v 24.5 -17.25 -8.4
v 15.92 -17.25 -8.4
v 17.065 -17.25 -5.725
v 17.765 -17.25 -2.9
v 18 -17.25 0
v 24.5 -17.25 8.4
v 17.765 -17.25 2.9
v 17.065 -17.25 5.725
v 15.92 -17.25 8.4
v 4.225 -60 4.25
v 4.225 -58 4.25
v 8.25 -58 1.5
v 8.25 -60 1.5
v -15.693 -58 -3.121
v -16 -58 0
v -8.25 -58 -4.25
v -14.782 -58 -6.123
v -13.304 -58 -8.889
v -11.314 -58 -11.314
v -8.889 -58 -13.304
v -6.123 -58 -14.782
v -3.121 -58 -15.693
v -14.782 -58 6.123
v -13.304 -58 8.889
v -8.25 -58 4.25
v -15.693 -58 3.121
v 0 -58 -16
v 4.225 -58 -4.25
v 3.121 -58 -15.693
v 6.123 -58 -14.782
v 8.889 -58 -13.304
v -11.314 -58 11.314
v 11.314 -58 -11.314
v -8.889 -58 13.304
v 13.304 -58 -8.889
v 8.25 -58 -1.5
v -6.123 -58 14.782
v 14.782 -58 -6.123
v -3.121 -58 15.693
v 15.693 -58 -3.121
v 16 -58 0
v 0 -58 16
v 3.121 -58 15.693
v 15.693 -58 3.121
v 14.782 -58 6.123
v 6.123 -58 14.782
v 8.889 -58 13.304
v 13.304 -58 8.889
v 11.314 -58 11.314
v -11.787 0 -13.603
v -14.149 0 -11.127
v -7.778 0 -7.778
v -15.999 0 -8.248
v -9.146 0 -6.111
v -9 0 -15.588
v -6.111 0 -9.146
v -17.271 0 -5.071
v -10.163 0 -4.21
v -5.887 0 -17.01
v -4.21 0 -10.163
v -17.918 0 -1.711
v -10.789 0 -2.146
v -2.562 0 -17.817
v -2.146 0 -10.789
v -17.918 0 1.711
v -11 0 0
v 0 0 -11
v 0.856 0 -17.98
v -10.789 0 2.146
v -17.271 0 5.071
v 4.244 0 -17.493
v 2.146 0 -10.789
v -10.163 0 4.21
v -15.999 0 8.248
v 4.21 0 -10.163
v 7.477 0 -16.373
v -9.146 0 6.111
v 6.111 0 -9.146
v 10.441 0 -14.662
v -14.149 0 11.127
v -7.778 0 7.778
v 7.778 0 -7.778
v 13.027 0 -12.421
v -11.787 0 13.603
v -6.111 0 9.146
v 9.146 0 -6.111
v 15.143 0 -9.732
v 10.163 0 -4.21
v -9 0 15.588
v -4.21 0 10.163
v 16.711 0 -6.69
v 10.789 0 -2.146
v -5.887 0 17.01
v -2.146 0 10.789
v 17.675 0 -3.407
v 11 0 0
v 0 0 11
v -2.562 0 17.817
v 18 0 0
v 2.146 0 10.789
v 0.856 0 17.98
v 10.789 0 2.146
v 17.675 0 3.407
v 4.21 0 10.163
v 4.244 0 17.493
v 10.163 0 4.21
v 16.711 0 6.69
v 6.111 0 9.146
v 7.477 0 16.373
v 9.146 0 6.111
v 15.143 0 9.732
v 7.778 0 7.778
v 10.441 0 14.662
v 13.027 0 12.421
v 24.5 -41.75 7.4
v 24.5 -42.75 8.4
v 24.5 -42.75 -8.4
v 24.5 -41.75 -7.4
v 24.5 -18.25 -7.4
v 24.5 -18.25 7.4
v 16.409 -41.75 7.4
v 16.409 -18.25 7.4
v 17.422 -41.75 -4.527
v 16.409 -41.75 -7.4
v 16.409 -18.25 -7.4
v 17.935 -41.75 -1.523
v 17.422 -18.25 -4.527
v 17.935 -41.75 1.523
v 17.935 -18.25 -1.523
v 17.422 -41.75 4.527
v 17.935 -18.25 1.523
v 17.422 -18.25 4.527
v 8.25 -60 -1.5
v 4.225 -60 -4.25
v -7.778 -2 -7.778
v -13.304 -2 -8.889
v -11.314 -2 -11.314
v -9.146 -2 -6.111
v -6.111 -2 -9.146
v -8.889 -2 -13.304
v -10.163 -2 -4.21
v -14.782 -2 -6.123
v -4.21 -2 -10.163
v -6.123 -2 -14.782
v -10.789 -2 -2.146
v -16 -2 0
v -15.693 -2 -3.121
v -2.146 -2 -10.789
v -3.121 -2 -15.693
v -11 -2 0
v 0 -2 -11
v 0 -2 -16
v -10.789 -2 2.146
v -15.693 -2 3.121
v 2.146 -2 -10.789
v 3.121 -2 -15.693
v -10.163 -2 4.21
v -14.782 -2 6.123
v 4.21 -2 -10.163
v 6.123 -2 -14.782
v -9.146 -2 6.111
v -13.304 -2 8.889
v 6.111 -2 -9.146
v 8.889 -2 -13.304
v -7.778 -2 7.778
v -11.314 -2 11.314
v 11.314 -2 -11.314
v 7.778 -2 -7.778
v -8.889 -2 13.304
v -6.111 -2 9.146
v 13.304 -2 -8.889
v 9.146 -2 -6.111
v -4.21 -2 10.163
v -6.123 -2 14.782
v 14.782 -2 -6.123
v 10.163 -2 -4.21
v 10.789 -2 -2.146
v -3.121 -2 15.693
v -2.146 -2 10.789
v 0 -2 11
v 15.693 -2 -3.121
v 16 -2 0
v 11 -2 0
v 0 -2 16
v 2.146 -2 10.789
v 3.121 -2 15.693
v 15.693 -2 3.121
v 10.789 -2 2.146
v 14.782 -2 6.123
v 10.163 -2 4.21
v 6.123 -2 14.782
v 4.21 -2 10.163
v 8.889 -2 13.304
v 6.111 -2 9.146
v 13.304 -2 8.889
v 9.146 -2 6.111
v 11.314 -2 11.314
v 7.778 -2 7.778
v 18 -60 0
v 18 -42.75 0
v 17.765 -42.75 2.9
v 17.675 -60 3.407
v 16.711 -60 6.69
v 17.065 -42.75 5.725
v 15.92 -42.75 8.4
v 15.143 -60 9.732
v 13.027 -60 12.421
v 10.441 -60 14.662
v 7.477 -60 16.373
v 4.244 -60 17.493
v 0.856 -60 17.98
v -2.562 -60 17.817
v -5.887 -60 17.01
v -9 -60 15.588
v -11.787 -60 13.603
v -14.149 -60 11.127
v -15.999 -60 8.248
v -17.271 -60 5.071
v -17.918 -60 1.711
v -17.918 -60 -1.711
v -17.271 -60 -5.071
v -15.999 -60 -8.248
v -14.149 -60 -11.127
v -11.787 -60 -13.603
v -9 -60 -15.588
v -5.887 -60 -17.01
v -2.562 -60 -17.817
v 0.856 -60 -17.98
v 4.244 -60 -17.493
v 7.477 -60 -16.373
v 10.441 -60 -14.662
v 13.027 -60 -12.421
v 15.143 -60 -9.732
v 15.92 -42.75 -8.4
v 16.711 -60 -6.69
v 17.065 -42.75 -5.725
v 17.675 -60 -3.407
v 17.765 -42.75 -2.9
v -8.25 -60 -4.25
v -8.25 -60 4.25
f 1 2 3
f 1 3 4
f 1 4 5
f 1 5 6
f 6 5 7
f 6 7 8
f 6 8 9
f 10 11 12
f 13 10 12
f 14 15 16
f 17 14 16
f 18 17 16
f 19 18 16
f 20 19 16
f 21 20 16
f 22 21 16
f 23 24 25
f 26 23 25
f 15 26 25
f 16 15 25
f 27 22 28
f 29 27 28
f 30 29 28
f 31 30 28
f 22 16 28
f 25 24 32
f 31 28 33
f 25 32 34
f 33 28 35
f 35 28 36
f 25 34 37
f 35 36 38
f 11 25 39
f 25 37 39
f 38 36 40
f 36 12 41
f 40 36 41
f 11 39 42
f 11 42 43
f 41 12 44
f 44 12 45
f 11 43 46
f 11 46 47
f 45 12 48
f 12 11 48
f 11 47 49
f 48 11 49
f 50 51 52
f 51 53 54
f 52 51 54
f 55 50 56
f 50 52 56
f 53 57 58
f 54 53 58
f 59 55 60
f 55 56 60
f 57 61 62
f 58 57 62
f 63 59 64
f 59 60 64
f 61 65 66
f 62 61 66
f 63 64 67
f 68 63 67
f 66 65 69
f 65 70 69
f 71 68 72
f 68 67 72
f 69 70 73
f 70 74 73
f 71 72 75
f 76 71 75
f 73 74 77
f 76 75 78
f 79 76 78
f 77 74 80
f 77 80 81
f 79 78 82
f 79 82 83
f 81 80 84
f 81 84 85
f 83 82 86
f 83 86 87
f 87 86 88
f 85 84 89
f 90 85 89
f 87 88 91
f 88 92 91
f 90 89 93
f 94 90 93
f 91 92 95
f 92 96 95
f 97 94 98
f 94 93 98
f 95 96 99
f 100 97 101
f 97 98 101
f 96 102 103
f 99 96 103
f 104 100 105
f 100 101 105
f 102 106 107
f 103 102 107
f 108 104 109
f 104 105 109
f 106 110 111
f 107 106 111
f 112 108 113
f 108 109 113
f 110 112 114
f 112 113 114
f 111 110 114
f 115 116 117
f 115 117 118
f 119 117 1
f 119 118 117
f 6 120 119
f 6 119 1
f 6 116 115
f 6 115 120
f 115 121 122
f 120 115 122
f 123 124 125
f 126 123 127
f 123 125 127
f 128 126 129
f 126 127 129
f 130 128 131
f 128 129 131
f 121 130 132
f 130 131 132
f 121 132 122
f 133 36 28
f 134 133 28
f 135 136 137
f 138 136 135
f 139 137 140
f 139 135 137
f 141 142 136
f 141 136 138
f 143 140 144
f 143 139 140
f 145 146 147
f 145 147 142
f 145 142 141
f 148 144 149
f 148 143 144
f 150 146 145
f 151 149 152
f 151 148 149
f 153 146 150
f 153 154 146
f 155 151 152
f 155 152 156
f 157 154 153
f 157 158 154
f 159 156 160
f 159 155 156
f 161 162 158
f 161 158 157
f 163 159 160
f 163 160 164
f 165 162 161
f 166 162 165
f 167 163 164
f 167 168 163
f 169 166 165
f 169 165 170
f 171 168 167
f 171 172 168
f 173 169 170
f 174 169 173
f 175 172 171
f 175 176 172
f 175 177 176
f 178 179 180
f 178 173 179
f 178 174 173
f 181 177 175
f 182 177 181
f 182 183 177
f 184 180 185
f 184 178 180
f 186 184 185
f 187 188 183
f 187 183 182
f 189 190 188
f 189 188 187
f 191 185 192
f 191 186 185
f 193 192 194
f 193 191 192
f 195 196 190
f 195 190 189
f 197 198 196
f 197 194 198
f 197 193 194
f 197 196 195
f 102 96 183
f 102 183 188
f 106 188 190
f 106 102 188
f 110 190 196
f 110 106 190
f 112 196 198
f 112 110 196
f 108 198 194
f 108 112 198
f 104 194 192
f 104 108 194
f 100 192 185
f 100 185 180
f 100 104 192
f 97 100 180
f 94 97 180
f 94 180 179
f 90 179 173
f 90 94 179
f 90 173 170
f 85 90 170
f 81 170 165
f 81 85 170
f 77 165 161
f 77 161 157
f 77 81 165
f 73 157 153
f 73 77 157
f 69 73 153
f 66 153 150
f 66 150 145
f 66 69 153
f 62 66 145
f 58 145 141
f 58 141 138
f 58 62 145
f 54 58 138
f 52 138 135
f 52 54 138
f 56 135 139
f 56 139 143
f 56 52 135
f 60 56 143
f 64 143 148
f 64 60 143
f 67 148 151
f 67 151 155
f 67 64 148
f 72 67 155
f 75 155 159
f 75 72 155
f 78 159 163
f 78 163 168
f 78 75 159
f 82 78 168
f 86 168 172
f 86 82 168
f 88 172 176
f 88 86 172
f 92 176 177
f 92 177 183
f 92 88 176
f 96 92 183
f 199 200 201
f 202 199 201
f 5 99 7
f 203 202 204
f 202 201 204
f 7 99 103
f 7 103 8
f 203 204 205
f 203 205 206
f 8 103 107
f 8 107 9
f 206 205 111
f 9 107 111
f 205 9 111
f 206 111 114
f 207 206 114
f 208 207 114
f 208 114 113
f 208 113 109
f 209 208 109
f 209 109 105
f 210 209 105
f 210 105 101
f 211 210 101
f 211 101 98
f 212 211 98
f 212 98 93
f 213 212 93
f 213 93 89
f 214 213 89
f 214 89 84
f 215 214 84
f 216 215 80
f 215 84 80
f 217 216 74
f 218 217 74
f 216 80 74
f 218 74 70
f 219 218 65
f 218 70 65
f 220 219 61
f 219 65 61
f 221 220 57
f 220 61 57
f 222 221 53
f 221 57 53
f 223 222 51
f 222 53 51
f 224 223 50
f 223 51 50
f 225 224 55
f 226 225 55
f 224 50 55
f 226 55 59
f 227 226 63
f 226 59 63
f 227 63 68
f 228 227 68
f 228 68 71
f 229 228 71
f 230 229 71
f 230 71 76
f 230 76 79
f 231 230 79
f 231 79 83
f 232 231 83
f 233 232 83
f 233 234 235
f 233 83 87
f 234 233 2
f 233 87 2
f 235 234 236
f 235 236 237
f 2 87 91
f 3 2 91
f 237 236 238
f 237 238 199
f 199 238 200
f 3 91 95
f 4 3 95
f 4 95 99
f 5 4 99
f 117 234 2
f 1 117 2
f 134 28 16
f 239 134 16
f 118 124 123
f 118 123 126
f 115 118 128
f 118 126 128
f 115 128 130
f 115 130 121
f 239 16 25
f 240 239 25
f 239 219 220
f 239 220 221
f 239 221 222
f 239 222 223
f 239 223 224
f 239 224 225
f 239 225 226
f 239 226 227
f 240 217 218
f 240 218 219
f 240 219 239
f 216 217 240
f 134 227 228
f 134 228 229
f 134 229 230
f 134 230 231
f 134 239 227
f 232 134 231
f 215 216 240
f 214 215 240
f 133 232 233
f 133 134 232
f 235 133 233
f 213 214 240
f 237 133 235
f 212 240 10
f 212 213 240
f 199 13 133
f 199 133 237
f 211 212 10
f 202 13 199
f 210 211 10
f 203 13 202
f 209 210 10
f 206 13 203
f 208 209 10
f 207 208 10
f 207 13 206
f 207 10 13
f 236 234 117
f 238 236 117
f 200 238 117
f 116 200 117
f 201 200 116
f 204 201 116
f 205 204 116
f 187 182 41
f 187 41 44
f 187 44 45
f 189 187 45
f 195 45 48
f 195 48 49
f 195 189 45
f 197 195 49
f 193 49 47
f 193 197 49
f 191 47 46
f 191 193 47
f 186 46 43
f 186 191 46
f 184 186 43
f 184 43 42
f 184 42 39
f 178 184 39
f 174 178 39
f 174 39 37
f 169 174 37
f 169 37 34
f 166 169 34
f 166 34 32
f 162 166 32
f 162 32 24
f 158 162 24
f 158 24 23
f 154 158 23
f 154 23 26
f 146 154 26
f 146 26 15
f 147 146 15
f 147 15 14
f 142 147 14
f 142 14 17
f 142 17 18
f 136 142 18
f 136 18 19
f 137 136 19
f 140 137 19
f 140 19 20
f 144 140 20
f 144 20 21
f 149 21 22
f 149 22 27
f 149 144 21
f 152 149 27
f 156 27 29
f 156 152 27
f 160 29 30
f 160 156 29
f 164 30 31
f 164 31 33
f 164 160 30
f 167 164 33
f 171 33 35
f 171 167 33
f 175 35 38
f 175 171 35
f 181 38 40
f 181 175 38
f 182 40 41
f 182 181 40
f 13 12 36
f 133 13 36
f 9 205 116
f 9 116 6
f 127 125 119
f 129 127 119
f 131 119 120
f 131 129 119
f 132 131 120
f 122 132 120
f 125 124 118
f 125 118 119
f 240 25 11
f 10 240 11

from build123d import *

# Parameters (mm, degrees)
F0_R     = 18
F0_R_2   = 16
F1_DEPTH = 60
F0_R_3   = 11
F2_DEPTH = 8
F3_W     = 25.5
F3_H     = 16.8
F3_W_2   = 23.5
F3_H_2   = 14.8
F4_DEPTH = 24.5
F5_DEPTH = 28.5
F6_DEPTH = 60
F7_DEPTH = 58
F8_DEPTH = 2


with BuildPart() as f1:
    # F0 (on Front) → F1 (new body)
    with BuildSketch(Plane.XZ):
        Circle(F0_R)
        Circle(F0_R_2, mode=Mode.SUBTRACT)
    extrude(amount=F1_DEPTH)

    # F0 (on Front) → F2 (join)
    with BuildSketch(Plane.XZ):
        Circle(F0_R_2)
        Circle(F0_R_3, mode=Mode.SUBTRACT)
    extrude(amount=F2_DEPTH)

    # F3 (on Right) → F4 (join)
    with BuildSketch(Plane.YZ):
        with Locations((-30, 0)):
            Rectangle(F3_W, F3_H)
        with Locations((-30, 0)):
            Rectangle(F3_W_2, F3_H_2, mode=Mode.SUBTRACT)
    extrude(amount=F4_DEPTH)

    # F5 (cut): a face of the model
    f5_faces = [f1.faces().sort_by_distance(p)[0] for p in [
        (7.6317317332, -42.75, 0),
    ]]
    extrude(f5_faces, amount=-F5_DEPTH, mode=Mode.SUBTRACT)

    # F0 (on Front) → F6 (join)
    with BuildSketch(Plane.XZ):
        Circle(F0_R_2)
        Circle(F0_R_3, mode=Mode.SUBTRACT)
        Circle(F0_R_3)
        Polygon((4.2248526588, 4.25), (8.25, 4.25), (8.25, 1.5), (8.25, -1.5), (8.25, -4.25), (4.2248526588, -4.25), (-8.25, -4.25), (-8.25, 4.25), align=None, mode=Mode.SUBTRACT)
        Polygon((8.25, 1.5), (8.25, 4.25), (4.2248526588, 4.25), align=None)
        Polygon((8.25, -4.25), (8.25, -1.5), (4.2248526588, -4.25), align=None)
    extrude(amount=F6_DEPTH)

    # F0 (on Front) → F7 (cut)
    with BuildSketch(Plane.XZ):
        Circle(F0_R_2)
        Circle(F0_R_3, mode=Mode.SUBTRACT)
        Circle(F0_R_3)
        Polygon((4.2248526588, 4.25), (8.25, 4.25), (8.25, 1.5), (8.25, -1.5), (8.25, -4.25), (4.2248526588, -4.25), (-8.25, -4.25), (-8.25, 4.25), align=None, mode=Mode.SUBTRACT)
        Polygon((8.25, 1.5), (8.25, 4.25), (4.2248526588, 4.25), align=None)
        Polygon((8.25, -4.25), (8.25, -1.5), (4.2248526588, -4.25), align=None)
    extrude(amount=F7_DEPTH, mode=Mode.SUBTRACT)

    # F0 (on Front) → F8 (join)
    with BuildSketch(Plane.XZ):
        Circle(F0_R_2)
        Circle(F0_R_3, mode=Mode.SUBTRACT)
    extrude(amount=F8_DEPTH)


solid = f1.part
